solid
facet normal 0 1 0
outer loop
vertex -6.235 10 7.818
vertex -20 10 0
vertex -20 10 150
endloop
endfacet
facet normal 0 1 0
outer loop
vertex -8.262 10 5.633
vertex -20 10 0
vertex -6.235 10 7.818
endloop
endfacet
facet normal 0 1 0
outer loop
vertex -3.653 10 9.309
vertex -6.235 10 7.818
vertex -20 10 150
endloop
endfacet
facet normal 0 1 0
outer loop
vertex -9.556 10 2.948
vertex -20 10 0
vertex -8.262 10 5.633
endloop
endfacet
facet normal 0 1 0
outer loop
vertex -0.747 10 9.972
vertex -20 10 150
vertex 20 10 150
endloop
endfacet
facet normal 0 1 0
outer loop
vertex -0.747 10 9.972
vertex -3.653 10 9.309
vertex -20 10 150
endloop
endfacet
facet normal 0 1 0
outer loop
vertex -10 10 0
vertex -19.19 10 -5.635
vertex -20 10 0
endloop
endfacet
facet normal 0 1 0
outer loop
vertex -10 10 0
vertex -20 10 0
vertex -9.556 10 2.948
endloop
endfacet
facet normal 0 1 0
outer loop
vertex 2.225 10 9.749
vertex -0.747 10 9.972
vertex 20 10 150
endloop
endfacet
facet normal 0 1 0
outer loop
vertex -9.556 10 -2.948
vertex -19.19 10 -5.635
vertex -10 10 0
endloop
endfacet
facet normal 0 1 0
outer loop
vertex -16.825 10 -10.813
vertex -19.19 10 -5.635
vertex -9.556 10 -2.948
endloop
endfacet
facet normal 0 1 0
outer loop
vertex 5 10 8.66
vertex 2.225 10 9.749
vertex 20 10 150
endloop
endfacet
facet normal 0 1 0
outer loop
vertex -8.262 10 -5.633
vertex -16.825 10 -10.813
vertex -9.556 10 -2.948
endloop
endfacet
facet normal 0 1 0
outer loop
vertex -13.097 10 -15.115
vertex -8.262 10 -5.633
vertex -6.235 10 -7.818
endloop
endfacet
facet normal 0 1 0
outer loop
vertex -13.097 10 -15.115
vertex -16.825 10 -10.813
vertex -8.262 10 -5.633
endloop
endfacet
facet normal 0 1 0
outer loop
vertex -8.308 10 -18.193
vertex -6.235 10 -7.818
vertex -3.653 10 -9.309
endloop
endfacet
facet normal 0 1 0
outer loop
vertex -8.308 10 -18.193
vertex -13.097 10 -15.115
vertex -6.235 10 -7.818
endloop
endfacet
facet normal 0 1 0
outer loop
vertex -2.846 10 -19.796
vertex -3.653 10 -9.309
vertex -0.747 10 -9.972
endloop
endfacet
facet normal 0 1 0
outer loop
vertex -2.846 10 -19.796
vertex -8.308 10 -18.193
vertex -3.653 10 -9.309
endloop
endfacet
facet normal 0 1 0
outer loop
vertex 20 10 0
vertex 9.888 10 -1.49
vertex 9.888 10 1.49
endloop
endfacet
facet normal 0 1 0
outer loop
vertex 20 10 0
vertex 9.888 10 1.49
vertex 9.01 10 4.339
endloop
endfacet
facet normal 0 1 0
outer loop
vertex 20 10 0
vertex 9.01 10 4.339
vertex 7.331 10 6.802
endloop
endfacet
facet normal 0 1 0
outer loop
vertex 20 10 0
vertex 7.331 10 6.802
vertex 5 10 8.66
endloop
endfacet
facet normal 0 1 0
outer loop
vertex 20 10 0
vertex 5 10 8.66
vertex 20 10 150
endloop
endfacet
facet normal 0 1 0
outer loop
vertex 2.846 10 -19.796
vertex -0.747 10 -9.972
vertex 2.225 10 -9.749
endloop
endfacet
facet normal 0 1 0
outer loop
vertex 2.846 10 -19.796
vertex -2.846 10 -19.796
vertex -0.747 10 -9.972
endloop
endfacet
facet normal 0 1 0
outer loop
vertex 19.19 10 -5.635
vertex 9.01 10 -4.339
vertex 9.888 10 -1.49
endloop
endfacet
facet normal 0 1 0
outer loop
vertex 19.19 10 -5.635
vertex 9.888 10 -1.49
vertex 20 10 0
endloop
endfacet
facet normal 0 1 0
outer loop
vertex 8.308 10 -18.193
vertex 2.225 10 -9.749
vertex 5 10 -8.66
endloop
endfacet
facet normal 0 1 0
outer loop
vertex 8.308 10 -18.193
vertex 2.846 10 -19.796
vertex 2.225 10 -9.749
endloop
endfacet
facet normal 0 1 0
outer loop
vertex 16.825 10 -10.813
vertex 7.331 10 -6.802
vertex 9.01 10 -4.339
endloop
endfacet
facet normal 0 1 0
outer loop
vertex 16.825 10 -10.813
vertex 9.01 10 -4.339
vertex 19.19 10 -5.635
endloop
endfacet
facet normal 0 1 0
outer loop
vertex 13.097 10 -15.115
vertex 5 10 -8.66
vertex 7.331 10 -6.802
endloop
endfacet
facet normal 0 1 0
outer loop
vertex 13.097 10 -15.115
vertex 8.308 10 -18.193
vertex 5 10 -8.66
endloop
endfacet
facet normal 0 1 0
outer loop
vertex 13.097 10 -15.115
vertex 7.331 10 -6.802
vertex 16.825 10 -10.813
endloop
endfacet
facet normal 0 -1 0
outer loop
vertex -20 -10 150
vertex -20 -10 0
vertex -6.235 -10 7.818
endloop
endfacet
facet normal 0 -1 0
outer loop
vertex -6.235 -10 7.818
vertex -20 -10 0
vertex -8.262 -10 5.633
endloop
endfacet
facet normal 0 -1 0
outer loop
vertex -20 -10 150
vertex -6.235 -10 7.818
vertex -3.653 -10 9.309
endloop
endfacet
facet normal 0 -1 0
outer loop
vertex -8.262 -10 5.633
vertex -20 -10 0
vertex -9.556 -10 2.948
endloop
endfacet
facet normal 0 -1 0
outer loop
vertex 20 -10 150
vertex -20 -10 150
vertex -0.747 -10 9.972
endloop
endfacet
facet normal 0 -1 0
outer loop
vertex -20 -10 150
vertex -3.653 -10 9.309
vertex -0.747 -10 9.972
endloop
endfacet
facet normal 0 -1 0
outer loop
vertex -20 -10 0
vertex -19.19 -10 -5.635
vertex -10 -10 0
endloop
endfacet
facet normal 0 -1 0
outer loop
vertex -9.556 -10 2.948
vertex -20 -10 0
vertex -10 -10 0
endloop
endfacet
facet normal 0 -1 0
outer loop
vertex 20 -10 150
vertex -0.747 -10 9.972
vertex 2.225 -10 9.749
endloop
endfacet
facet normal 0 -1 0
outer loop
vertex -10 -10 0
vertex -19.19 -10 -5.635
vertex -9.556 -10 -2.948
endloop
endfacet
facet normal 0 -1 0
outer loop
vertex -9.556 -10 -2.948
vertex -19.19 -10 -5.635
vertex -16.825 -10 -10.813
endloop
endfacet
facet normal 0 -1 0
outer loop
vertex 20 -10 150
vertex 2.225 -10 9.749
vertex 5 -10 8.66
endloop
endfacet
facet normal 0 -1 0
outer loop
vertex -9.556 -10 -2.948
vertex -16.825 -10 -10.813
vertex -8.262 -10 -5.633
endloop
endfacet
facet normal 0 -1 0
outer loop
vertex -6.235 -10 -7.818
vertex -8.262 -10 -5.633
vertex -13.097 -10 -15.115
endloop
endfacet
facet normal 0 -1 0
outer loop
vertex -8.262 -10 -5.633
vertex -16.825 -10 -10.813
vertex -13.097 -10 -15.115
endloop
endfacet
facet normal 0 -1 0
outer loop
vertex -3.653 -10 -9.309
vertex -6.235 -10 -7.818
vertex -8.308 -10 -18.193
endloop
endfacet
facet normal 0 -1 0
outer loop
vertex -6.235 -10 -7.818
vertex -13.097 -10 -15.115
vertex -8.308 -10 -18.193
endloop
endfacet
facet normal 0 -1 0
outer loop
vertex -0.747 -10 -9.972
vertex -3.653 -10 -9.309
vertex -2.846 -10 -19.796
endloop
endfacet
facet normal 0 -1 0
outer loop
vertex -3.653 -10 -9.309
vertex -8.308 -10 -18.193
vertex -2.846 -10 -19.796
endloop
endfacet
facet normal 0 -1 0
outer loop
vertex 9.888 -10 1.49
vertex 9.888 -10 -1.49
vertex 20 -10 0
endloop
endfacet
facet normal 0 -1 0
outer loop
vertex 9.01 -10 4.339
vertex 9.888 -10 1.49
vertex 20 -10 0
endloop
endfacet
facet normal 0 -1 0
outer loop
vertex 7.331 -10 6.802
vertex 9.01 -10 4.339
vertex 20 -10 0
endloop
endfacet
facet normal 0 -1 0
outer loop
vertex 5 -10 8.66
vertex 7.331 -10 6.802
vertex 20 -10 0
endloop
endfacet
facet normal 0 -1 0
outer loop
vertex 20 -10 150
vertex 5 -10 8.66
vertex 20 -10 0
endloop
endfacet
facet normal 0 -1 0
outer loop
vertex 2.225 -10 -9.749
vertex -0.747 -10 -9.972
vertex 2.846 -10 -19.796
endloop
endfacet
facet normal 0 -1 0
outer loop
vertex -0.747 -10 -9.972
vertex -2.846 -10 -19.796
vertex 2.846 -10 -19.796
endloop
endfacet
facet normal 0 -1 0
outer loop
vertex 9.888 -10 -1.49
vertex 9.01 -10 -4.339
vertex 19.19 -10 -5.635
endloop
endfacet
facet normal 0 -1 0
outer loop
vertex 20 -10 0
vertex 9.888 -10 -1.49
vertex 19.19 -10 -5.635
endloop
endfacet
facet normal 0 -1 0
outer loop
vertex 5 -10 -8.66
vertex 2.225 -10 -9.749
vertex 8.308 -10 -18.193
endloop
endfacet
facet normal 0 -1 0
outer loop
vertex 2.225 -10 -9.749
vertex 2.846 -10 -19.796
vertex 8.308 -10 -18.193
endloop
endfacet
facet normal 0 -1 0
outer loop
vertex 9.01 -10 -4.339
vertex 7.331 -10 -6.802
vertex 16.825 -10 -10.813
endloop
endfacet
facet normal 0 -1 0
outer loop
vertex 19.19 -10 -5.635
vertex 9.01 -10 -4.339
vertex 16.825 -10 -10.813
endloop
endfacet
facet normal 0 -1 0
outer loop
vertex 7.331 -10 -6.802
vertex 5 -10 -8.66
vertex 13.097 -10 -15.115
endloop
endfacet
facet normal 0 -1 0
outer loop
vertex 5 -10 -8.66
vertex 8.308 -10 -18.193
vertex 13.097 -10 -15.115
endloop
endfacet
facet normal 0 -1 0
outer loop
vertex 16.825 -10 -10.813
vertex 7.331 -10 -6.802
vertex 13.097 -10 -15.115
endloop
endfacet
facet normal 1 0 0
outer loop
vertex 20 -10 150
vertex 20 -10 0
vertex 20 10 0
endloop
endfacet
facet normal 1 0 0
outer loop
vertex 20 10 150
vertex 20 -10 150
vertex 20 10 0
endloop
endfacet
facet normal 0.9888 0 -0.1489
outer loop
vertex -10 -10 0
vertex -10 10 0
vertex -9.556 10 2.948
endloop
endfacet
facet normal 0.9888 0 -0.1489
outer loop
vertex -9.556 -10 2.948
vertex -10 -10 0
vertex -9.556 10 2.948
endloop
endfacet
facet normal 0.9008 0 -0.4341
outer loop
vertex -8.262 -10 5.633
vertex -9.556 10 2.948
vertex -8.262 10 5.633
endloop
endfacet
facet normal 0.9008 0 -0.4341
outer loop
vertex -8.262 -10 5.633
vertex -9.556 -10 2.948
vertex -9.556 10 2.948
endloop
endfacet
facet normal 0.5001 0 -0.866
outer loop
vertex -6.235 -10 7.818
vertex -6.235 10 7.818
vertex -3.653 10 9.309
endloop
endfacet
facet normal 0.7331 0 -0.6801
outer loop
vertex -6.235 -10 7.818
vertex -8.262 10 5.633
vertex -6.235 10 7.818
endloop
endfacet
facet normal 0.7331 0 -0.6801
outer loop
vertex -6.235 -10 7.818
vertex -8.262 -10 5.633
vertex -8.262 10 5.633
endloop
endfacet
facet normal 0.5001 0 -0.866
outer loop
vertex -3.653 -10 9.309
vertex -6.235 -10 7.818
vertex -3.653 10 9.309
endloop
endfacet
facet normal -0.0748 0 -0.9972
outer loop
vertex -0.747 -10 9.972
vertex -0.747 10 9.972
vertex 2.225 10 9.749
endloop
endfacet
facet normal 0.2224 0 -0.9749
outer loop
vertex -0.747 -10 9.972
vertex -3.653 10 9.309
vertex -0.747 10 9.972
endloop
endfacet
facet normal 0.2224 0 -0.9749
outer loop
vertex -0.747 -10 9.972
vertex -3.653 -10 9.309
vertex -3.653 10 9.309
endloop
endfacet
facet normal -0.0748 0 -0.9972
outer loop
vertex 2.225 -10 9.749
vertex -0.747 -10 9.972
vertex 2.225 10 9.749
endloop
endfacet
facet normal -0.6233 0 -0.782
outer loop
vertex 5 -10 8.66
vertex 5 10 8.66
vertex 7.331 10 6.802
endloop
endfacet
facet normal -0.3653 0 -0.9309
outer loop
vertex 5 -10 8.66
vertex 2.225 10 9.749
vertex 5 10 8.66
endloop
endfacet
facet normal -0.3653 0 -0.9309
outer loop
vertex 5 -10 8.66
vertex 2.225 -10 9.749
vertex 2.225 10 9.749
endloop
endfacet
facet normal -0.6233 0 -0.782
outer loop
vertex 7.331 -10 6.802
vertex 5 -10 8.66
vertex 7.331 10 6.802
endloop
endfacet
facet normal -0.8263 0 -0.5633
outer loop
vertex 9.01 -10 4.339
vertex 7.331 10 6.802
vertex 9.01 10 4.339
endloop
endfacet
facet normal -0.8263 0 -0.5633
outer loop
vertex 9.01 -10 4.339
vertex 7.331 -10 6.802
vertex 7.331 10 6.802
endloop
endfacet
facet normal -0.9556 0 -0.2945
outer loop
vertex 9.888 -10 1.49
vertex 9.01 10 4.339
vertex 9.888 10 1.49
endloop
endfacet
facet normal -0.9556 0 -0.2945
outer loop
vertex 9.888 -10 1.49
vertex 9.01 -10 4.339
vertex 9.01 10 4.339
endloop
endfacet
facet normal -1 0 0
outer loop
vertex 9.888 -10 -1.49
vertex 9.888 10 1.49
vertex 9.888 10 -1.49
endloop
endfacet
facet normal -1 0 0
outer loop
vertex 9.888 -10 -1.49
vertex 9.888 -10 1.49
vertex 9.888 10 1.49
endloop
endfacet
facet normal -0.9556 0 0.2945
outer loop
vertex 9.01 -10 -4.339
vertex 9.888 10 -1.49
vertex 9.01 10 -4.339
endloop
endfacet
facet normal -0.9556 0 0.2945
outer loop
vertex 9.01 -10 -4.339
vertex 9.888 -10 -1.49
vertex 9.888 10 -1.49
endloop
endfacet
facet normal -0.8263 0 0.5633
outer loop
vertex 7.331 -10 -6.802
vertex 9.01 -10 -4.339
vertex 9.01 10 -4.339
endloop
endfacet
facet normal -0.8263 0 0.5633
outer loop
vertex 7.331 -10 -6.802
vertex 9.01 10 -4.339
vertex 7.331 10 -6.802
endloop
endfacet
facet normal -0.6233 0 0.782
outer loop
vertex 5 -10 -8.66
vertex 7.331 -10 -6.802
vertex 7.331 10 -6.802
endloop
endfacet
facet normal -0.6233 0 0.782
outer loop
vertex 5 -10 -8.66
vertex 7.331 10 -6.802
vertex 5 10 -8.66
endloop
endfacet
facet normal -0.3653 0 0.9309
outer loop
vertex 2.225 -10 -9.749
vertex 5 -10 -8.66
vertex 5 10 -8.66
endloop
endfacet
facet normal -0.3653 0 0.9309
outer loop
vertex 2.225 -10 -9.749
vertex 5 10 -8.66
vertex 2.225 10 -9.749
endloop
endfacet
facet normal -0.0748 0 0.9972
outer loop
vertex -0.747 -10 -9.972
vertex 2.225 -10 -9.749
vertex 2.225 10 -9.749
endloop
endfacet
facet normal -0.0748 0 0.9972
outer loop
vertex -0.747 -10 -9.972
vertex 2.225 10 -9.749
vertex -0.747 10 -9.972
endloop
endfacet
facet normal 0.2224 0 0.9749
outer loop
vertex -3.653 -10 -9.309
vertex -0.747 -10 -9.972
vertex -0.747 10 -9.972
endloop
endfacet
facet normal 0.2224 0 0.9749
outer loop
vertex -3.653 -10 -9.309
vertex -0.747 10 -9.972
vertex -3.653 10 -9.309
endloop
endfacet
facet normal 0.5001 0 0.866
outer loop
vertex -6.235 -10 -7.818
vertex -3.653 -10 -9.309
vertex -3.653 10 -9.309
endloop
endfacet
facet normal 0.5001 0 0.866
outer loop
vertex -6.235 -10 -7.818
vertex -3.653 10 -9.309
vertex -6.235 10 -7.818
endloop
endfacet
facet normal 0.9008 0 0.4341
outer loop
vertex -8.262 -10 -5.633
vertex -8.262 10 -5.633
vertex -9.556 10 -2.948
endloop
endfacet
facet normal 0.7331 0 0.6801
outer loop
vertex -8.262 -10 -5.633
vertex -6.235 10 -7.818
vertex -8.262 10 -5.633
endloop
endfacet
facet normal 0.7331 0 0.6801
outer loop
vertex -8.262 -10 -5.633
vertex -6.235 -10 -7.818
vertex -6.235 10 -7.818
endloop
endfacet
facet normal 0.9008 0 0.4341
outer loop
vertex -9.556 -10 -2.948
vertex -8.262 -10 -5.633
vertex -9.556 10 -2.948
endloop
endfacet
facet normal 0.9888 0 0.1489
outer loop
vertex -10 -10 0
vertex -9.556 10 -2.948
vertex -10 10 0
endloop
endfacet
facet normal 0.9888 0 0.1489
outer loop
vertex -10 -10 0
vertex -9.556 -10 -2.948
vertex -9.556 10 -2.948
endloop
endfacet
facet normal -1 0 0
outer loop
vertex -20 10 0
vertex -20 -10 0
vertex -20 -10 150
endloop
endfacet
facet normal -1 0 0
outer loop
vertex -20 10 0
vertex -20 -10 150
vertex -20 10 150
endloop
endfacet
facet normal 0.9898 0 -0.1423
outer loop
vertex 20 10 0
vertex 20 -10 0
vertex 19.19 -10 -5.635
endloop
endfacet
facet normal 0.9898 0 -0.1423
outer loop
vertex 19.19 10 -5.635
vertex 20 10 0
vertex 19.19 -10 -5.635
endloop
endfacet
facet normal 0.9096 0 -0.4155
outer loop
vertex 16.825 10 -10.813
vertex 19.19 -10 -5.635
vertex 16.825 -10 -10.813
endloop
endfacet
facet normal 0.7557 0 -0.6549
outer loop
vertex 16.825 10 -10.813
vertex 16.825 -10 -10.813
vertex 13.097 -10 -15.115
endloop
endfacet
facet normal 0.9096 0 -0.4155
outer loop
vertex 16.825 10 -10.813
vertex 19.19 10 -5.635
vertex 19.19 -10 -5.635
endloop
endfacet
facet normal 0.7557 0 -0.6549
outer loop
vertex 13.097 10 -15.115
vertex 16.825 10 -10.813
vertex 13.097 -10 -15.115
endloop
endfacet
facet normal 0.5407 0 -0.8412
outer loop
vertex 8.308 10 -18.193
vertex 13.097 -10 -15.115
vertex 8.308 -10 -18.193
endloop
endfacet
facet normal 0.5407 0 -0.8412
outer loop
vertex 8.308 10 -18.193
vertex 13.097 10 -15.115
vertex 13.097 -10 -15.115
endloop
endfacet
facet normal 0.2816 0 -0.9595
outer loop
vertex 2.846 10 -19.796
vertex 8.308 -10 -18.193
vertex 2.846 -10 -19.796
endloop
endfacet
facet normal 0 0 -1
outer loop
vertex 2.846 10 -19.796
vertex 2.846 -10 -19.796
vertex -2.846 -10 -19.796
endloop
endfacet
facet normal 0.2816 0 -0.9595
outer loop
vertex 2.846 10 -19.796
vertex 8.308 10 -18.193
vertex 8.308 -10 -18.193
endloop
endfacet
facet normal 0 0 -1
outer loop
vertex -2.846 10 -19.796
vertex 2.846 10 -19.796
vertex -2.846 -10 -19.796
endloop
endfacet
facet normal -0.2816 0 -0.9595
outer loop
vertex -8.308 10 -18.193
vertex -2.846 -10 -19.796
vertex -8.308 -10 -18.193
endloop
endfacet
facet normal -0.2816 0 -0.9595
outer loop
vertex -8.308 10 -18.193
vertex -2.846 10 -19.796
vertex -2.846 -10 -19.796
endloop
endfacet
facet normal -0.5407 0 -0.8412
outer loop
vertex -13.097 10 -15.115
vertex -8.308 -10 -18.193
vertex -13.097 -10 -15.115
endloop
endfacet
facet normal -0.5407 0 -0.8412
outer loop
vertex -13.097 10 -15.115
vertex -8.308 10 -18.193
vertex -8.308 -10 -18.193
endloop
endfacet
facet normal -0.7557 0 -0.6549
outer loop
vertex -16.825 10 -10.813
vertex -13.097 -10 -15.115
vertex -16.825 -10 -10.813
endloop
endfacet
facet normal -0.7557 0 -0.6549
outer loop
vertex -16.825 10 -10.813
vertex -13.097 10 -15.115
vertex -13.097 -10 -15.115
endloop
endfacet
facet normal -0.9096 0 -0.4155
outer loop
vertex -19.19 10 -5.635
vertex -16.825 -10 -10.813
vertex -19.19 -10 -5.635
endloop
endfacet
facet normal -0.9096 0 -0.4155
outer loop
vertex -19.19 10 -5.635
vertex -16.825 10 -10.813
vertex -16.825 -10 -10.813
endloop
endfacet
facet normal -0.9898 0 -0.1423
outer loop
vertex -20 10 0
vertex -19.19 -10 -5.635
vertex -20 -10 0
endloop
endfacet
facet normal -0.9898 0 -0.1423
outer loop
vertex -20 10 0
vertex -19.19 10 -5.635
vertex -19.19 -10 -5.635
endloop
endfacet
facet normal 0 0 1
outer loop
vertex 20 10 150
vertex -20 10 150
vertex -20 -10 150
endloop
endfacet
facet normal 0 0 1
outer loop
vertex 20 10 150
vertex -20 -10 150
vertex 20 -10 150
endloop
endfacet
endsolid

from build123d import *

# Parameters (mm, degrees)
SKETCH_1_W               = 40
SKETCH_1_H               = 20
EXTRUDE_2_DEPTH          = 150
SKETCH_5_R               = 20
EXTRUDE_3_DEPTH          = 20
CUT_EXTRUDE_1_DEPTH      = 153.643375225
CUT_EXTRUDE_1_DEPTH_BACK = 153.643375225
SKETCH_6_R               = 10


with BuildPart() as part:
    # 스케치1 → 보스-돌출2 (new body)
    with BuildSketch(Plane.XY):
        Rectangle(SKETCH_1_W, SKETCH_1_H)
    extrude(amount=EXTRUDE_2_DEPTH)

    # 스케치5 → 보스-돌출3 (add)
    with BuildSketch(Plane(origin=(0, 10, 0), x_dir=(1, 0, 0), z_dir=(0, 1, 0))):
        Circle(SKETCH_5_R)
    extrude(amount=-EXTRUDE_3_DEPTH)

    # 스케치6 → 컷-돌출1 (cut, two sides: drawn at the far end of the back side and taken through both)
    with BuildSketch(Plane(origin=(0, 10, 0), x_dir=(1, 0, 0), z_dir=(0, 1, 0)).offset(-CUT_EXTRUDE_1_DEPTH_BACK)):
        with Locations(Location((0, 0, 0), (0, 0, 180))):
            Circle(SKETCH_6_R)
    extrude(amount=CUT_EXTRUDE_1_DEPTH + CUT_EXTRUDE_1_DEPTH_BACK, mode=Mode.SUBTRACT)


solid = part.part
